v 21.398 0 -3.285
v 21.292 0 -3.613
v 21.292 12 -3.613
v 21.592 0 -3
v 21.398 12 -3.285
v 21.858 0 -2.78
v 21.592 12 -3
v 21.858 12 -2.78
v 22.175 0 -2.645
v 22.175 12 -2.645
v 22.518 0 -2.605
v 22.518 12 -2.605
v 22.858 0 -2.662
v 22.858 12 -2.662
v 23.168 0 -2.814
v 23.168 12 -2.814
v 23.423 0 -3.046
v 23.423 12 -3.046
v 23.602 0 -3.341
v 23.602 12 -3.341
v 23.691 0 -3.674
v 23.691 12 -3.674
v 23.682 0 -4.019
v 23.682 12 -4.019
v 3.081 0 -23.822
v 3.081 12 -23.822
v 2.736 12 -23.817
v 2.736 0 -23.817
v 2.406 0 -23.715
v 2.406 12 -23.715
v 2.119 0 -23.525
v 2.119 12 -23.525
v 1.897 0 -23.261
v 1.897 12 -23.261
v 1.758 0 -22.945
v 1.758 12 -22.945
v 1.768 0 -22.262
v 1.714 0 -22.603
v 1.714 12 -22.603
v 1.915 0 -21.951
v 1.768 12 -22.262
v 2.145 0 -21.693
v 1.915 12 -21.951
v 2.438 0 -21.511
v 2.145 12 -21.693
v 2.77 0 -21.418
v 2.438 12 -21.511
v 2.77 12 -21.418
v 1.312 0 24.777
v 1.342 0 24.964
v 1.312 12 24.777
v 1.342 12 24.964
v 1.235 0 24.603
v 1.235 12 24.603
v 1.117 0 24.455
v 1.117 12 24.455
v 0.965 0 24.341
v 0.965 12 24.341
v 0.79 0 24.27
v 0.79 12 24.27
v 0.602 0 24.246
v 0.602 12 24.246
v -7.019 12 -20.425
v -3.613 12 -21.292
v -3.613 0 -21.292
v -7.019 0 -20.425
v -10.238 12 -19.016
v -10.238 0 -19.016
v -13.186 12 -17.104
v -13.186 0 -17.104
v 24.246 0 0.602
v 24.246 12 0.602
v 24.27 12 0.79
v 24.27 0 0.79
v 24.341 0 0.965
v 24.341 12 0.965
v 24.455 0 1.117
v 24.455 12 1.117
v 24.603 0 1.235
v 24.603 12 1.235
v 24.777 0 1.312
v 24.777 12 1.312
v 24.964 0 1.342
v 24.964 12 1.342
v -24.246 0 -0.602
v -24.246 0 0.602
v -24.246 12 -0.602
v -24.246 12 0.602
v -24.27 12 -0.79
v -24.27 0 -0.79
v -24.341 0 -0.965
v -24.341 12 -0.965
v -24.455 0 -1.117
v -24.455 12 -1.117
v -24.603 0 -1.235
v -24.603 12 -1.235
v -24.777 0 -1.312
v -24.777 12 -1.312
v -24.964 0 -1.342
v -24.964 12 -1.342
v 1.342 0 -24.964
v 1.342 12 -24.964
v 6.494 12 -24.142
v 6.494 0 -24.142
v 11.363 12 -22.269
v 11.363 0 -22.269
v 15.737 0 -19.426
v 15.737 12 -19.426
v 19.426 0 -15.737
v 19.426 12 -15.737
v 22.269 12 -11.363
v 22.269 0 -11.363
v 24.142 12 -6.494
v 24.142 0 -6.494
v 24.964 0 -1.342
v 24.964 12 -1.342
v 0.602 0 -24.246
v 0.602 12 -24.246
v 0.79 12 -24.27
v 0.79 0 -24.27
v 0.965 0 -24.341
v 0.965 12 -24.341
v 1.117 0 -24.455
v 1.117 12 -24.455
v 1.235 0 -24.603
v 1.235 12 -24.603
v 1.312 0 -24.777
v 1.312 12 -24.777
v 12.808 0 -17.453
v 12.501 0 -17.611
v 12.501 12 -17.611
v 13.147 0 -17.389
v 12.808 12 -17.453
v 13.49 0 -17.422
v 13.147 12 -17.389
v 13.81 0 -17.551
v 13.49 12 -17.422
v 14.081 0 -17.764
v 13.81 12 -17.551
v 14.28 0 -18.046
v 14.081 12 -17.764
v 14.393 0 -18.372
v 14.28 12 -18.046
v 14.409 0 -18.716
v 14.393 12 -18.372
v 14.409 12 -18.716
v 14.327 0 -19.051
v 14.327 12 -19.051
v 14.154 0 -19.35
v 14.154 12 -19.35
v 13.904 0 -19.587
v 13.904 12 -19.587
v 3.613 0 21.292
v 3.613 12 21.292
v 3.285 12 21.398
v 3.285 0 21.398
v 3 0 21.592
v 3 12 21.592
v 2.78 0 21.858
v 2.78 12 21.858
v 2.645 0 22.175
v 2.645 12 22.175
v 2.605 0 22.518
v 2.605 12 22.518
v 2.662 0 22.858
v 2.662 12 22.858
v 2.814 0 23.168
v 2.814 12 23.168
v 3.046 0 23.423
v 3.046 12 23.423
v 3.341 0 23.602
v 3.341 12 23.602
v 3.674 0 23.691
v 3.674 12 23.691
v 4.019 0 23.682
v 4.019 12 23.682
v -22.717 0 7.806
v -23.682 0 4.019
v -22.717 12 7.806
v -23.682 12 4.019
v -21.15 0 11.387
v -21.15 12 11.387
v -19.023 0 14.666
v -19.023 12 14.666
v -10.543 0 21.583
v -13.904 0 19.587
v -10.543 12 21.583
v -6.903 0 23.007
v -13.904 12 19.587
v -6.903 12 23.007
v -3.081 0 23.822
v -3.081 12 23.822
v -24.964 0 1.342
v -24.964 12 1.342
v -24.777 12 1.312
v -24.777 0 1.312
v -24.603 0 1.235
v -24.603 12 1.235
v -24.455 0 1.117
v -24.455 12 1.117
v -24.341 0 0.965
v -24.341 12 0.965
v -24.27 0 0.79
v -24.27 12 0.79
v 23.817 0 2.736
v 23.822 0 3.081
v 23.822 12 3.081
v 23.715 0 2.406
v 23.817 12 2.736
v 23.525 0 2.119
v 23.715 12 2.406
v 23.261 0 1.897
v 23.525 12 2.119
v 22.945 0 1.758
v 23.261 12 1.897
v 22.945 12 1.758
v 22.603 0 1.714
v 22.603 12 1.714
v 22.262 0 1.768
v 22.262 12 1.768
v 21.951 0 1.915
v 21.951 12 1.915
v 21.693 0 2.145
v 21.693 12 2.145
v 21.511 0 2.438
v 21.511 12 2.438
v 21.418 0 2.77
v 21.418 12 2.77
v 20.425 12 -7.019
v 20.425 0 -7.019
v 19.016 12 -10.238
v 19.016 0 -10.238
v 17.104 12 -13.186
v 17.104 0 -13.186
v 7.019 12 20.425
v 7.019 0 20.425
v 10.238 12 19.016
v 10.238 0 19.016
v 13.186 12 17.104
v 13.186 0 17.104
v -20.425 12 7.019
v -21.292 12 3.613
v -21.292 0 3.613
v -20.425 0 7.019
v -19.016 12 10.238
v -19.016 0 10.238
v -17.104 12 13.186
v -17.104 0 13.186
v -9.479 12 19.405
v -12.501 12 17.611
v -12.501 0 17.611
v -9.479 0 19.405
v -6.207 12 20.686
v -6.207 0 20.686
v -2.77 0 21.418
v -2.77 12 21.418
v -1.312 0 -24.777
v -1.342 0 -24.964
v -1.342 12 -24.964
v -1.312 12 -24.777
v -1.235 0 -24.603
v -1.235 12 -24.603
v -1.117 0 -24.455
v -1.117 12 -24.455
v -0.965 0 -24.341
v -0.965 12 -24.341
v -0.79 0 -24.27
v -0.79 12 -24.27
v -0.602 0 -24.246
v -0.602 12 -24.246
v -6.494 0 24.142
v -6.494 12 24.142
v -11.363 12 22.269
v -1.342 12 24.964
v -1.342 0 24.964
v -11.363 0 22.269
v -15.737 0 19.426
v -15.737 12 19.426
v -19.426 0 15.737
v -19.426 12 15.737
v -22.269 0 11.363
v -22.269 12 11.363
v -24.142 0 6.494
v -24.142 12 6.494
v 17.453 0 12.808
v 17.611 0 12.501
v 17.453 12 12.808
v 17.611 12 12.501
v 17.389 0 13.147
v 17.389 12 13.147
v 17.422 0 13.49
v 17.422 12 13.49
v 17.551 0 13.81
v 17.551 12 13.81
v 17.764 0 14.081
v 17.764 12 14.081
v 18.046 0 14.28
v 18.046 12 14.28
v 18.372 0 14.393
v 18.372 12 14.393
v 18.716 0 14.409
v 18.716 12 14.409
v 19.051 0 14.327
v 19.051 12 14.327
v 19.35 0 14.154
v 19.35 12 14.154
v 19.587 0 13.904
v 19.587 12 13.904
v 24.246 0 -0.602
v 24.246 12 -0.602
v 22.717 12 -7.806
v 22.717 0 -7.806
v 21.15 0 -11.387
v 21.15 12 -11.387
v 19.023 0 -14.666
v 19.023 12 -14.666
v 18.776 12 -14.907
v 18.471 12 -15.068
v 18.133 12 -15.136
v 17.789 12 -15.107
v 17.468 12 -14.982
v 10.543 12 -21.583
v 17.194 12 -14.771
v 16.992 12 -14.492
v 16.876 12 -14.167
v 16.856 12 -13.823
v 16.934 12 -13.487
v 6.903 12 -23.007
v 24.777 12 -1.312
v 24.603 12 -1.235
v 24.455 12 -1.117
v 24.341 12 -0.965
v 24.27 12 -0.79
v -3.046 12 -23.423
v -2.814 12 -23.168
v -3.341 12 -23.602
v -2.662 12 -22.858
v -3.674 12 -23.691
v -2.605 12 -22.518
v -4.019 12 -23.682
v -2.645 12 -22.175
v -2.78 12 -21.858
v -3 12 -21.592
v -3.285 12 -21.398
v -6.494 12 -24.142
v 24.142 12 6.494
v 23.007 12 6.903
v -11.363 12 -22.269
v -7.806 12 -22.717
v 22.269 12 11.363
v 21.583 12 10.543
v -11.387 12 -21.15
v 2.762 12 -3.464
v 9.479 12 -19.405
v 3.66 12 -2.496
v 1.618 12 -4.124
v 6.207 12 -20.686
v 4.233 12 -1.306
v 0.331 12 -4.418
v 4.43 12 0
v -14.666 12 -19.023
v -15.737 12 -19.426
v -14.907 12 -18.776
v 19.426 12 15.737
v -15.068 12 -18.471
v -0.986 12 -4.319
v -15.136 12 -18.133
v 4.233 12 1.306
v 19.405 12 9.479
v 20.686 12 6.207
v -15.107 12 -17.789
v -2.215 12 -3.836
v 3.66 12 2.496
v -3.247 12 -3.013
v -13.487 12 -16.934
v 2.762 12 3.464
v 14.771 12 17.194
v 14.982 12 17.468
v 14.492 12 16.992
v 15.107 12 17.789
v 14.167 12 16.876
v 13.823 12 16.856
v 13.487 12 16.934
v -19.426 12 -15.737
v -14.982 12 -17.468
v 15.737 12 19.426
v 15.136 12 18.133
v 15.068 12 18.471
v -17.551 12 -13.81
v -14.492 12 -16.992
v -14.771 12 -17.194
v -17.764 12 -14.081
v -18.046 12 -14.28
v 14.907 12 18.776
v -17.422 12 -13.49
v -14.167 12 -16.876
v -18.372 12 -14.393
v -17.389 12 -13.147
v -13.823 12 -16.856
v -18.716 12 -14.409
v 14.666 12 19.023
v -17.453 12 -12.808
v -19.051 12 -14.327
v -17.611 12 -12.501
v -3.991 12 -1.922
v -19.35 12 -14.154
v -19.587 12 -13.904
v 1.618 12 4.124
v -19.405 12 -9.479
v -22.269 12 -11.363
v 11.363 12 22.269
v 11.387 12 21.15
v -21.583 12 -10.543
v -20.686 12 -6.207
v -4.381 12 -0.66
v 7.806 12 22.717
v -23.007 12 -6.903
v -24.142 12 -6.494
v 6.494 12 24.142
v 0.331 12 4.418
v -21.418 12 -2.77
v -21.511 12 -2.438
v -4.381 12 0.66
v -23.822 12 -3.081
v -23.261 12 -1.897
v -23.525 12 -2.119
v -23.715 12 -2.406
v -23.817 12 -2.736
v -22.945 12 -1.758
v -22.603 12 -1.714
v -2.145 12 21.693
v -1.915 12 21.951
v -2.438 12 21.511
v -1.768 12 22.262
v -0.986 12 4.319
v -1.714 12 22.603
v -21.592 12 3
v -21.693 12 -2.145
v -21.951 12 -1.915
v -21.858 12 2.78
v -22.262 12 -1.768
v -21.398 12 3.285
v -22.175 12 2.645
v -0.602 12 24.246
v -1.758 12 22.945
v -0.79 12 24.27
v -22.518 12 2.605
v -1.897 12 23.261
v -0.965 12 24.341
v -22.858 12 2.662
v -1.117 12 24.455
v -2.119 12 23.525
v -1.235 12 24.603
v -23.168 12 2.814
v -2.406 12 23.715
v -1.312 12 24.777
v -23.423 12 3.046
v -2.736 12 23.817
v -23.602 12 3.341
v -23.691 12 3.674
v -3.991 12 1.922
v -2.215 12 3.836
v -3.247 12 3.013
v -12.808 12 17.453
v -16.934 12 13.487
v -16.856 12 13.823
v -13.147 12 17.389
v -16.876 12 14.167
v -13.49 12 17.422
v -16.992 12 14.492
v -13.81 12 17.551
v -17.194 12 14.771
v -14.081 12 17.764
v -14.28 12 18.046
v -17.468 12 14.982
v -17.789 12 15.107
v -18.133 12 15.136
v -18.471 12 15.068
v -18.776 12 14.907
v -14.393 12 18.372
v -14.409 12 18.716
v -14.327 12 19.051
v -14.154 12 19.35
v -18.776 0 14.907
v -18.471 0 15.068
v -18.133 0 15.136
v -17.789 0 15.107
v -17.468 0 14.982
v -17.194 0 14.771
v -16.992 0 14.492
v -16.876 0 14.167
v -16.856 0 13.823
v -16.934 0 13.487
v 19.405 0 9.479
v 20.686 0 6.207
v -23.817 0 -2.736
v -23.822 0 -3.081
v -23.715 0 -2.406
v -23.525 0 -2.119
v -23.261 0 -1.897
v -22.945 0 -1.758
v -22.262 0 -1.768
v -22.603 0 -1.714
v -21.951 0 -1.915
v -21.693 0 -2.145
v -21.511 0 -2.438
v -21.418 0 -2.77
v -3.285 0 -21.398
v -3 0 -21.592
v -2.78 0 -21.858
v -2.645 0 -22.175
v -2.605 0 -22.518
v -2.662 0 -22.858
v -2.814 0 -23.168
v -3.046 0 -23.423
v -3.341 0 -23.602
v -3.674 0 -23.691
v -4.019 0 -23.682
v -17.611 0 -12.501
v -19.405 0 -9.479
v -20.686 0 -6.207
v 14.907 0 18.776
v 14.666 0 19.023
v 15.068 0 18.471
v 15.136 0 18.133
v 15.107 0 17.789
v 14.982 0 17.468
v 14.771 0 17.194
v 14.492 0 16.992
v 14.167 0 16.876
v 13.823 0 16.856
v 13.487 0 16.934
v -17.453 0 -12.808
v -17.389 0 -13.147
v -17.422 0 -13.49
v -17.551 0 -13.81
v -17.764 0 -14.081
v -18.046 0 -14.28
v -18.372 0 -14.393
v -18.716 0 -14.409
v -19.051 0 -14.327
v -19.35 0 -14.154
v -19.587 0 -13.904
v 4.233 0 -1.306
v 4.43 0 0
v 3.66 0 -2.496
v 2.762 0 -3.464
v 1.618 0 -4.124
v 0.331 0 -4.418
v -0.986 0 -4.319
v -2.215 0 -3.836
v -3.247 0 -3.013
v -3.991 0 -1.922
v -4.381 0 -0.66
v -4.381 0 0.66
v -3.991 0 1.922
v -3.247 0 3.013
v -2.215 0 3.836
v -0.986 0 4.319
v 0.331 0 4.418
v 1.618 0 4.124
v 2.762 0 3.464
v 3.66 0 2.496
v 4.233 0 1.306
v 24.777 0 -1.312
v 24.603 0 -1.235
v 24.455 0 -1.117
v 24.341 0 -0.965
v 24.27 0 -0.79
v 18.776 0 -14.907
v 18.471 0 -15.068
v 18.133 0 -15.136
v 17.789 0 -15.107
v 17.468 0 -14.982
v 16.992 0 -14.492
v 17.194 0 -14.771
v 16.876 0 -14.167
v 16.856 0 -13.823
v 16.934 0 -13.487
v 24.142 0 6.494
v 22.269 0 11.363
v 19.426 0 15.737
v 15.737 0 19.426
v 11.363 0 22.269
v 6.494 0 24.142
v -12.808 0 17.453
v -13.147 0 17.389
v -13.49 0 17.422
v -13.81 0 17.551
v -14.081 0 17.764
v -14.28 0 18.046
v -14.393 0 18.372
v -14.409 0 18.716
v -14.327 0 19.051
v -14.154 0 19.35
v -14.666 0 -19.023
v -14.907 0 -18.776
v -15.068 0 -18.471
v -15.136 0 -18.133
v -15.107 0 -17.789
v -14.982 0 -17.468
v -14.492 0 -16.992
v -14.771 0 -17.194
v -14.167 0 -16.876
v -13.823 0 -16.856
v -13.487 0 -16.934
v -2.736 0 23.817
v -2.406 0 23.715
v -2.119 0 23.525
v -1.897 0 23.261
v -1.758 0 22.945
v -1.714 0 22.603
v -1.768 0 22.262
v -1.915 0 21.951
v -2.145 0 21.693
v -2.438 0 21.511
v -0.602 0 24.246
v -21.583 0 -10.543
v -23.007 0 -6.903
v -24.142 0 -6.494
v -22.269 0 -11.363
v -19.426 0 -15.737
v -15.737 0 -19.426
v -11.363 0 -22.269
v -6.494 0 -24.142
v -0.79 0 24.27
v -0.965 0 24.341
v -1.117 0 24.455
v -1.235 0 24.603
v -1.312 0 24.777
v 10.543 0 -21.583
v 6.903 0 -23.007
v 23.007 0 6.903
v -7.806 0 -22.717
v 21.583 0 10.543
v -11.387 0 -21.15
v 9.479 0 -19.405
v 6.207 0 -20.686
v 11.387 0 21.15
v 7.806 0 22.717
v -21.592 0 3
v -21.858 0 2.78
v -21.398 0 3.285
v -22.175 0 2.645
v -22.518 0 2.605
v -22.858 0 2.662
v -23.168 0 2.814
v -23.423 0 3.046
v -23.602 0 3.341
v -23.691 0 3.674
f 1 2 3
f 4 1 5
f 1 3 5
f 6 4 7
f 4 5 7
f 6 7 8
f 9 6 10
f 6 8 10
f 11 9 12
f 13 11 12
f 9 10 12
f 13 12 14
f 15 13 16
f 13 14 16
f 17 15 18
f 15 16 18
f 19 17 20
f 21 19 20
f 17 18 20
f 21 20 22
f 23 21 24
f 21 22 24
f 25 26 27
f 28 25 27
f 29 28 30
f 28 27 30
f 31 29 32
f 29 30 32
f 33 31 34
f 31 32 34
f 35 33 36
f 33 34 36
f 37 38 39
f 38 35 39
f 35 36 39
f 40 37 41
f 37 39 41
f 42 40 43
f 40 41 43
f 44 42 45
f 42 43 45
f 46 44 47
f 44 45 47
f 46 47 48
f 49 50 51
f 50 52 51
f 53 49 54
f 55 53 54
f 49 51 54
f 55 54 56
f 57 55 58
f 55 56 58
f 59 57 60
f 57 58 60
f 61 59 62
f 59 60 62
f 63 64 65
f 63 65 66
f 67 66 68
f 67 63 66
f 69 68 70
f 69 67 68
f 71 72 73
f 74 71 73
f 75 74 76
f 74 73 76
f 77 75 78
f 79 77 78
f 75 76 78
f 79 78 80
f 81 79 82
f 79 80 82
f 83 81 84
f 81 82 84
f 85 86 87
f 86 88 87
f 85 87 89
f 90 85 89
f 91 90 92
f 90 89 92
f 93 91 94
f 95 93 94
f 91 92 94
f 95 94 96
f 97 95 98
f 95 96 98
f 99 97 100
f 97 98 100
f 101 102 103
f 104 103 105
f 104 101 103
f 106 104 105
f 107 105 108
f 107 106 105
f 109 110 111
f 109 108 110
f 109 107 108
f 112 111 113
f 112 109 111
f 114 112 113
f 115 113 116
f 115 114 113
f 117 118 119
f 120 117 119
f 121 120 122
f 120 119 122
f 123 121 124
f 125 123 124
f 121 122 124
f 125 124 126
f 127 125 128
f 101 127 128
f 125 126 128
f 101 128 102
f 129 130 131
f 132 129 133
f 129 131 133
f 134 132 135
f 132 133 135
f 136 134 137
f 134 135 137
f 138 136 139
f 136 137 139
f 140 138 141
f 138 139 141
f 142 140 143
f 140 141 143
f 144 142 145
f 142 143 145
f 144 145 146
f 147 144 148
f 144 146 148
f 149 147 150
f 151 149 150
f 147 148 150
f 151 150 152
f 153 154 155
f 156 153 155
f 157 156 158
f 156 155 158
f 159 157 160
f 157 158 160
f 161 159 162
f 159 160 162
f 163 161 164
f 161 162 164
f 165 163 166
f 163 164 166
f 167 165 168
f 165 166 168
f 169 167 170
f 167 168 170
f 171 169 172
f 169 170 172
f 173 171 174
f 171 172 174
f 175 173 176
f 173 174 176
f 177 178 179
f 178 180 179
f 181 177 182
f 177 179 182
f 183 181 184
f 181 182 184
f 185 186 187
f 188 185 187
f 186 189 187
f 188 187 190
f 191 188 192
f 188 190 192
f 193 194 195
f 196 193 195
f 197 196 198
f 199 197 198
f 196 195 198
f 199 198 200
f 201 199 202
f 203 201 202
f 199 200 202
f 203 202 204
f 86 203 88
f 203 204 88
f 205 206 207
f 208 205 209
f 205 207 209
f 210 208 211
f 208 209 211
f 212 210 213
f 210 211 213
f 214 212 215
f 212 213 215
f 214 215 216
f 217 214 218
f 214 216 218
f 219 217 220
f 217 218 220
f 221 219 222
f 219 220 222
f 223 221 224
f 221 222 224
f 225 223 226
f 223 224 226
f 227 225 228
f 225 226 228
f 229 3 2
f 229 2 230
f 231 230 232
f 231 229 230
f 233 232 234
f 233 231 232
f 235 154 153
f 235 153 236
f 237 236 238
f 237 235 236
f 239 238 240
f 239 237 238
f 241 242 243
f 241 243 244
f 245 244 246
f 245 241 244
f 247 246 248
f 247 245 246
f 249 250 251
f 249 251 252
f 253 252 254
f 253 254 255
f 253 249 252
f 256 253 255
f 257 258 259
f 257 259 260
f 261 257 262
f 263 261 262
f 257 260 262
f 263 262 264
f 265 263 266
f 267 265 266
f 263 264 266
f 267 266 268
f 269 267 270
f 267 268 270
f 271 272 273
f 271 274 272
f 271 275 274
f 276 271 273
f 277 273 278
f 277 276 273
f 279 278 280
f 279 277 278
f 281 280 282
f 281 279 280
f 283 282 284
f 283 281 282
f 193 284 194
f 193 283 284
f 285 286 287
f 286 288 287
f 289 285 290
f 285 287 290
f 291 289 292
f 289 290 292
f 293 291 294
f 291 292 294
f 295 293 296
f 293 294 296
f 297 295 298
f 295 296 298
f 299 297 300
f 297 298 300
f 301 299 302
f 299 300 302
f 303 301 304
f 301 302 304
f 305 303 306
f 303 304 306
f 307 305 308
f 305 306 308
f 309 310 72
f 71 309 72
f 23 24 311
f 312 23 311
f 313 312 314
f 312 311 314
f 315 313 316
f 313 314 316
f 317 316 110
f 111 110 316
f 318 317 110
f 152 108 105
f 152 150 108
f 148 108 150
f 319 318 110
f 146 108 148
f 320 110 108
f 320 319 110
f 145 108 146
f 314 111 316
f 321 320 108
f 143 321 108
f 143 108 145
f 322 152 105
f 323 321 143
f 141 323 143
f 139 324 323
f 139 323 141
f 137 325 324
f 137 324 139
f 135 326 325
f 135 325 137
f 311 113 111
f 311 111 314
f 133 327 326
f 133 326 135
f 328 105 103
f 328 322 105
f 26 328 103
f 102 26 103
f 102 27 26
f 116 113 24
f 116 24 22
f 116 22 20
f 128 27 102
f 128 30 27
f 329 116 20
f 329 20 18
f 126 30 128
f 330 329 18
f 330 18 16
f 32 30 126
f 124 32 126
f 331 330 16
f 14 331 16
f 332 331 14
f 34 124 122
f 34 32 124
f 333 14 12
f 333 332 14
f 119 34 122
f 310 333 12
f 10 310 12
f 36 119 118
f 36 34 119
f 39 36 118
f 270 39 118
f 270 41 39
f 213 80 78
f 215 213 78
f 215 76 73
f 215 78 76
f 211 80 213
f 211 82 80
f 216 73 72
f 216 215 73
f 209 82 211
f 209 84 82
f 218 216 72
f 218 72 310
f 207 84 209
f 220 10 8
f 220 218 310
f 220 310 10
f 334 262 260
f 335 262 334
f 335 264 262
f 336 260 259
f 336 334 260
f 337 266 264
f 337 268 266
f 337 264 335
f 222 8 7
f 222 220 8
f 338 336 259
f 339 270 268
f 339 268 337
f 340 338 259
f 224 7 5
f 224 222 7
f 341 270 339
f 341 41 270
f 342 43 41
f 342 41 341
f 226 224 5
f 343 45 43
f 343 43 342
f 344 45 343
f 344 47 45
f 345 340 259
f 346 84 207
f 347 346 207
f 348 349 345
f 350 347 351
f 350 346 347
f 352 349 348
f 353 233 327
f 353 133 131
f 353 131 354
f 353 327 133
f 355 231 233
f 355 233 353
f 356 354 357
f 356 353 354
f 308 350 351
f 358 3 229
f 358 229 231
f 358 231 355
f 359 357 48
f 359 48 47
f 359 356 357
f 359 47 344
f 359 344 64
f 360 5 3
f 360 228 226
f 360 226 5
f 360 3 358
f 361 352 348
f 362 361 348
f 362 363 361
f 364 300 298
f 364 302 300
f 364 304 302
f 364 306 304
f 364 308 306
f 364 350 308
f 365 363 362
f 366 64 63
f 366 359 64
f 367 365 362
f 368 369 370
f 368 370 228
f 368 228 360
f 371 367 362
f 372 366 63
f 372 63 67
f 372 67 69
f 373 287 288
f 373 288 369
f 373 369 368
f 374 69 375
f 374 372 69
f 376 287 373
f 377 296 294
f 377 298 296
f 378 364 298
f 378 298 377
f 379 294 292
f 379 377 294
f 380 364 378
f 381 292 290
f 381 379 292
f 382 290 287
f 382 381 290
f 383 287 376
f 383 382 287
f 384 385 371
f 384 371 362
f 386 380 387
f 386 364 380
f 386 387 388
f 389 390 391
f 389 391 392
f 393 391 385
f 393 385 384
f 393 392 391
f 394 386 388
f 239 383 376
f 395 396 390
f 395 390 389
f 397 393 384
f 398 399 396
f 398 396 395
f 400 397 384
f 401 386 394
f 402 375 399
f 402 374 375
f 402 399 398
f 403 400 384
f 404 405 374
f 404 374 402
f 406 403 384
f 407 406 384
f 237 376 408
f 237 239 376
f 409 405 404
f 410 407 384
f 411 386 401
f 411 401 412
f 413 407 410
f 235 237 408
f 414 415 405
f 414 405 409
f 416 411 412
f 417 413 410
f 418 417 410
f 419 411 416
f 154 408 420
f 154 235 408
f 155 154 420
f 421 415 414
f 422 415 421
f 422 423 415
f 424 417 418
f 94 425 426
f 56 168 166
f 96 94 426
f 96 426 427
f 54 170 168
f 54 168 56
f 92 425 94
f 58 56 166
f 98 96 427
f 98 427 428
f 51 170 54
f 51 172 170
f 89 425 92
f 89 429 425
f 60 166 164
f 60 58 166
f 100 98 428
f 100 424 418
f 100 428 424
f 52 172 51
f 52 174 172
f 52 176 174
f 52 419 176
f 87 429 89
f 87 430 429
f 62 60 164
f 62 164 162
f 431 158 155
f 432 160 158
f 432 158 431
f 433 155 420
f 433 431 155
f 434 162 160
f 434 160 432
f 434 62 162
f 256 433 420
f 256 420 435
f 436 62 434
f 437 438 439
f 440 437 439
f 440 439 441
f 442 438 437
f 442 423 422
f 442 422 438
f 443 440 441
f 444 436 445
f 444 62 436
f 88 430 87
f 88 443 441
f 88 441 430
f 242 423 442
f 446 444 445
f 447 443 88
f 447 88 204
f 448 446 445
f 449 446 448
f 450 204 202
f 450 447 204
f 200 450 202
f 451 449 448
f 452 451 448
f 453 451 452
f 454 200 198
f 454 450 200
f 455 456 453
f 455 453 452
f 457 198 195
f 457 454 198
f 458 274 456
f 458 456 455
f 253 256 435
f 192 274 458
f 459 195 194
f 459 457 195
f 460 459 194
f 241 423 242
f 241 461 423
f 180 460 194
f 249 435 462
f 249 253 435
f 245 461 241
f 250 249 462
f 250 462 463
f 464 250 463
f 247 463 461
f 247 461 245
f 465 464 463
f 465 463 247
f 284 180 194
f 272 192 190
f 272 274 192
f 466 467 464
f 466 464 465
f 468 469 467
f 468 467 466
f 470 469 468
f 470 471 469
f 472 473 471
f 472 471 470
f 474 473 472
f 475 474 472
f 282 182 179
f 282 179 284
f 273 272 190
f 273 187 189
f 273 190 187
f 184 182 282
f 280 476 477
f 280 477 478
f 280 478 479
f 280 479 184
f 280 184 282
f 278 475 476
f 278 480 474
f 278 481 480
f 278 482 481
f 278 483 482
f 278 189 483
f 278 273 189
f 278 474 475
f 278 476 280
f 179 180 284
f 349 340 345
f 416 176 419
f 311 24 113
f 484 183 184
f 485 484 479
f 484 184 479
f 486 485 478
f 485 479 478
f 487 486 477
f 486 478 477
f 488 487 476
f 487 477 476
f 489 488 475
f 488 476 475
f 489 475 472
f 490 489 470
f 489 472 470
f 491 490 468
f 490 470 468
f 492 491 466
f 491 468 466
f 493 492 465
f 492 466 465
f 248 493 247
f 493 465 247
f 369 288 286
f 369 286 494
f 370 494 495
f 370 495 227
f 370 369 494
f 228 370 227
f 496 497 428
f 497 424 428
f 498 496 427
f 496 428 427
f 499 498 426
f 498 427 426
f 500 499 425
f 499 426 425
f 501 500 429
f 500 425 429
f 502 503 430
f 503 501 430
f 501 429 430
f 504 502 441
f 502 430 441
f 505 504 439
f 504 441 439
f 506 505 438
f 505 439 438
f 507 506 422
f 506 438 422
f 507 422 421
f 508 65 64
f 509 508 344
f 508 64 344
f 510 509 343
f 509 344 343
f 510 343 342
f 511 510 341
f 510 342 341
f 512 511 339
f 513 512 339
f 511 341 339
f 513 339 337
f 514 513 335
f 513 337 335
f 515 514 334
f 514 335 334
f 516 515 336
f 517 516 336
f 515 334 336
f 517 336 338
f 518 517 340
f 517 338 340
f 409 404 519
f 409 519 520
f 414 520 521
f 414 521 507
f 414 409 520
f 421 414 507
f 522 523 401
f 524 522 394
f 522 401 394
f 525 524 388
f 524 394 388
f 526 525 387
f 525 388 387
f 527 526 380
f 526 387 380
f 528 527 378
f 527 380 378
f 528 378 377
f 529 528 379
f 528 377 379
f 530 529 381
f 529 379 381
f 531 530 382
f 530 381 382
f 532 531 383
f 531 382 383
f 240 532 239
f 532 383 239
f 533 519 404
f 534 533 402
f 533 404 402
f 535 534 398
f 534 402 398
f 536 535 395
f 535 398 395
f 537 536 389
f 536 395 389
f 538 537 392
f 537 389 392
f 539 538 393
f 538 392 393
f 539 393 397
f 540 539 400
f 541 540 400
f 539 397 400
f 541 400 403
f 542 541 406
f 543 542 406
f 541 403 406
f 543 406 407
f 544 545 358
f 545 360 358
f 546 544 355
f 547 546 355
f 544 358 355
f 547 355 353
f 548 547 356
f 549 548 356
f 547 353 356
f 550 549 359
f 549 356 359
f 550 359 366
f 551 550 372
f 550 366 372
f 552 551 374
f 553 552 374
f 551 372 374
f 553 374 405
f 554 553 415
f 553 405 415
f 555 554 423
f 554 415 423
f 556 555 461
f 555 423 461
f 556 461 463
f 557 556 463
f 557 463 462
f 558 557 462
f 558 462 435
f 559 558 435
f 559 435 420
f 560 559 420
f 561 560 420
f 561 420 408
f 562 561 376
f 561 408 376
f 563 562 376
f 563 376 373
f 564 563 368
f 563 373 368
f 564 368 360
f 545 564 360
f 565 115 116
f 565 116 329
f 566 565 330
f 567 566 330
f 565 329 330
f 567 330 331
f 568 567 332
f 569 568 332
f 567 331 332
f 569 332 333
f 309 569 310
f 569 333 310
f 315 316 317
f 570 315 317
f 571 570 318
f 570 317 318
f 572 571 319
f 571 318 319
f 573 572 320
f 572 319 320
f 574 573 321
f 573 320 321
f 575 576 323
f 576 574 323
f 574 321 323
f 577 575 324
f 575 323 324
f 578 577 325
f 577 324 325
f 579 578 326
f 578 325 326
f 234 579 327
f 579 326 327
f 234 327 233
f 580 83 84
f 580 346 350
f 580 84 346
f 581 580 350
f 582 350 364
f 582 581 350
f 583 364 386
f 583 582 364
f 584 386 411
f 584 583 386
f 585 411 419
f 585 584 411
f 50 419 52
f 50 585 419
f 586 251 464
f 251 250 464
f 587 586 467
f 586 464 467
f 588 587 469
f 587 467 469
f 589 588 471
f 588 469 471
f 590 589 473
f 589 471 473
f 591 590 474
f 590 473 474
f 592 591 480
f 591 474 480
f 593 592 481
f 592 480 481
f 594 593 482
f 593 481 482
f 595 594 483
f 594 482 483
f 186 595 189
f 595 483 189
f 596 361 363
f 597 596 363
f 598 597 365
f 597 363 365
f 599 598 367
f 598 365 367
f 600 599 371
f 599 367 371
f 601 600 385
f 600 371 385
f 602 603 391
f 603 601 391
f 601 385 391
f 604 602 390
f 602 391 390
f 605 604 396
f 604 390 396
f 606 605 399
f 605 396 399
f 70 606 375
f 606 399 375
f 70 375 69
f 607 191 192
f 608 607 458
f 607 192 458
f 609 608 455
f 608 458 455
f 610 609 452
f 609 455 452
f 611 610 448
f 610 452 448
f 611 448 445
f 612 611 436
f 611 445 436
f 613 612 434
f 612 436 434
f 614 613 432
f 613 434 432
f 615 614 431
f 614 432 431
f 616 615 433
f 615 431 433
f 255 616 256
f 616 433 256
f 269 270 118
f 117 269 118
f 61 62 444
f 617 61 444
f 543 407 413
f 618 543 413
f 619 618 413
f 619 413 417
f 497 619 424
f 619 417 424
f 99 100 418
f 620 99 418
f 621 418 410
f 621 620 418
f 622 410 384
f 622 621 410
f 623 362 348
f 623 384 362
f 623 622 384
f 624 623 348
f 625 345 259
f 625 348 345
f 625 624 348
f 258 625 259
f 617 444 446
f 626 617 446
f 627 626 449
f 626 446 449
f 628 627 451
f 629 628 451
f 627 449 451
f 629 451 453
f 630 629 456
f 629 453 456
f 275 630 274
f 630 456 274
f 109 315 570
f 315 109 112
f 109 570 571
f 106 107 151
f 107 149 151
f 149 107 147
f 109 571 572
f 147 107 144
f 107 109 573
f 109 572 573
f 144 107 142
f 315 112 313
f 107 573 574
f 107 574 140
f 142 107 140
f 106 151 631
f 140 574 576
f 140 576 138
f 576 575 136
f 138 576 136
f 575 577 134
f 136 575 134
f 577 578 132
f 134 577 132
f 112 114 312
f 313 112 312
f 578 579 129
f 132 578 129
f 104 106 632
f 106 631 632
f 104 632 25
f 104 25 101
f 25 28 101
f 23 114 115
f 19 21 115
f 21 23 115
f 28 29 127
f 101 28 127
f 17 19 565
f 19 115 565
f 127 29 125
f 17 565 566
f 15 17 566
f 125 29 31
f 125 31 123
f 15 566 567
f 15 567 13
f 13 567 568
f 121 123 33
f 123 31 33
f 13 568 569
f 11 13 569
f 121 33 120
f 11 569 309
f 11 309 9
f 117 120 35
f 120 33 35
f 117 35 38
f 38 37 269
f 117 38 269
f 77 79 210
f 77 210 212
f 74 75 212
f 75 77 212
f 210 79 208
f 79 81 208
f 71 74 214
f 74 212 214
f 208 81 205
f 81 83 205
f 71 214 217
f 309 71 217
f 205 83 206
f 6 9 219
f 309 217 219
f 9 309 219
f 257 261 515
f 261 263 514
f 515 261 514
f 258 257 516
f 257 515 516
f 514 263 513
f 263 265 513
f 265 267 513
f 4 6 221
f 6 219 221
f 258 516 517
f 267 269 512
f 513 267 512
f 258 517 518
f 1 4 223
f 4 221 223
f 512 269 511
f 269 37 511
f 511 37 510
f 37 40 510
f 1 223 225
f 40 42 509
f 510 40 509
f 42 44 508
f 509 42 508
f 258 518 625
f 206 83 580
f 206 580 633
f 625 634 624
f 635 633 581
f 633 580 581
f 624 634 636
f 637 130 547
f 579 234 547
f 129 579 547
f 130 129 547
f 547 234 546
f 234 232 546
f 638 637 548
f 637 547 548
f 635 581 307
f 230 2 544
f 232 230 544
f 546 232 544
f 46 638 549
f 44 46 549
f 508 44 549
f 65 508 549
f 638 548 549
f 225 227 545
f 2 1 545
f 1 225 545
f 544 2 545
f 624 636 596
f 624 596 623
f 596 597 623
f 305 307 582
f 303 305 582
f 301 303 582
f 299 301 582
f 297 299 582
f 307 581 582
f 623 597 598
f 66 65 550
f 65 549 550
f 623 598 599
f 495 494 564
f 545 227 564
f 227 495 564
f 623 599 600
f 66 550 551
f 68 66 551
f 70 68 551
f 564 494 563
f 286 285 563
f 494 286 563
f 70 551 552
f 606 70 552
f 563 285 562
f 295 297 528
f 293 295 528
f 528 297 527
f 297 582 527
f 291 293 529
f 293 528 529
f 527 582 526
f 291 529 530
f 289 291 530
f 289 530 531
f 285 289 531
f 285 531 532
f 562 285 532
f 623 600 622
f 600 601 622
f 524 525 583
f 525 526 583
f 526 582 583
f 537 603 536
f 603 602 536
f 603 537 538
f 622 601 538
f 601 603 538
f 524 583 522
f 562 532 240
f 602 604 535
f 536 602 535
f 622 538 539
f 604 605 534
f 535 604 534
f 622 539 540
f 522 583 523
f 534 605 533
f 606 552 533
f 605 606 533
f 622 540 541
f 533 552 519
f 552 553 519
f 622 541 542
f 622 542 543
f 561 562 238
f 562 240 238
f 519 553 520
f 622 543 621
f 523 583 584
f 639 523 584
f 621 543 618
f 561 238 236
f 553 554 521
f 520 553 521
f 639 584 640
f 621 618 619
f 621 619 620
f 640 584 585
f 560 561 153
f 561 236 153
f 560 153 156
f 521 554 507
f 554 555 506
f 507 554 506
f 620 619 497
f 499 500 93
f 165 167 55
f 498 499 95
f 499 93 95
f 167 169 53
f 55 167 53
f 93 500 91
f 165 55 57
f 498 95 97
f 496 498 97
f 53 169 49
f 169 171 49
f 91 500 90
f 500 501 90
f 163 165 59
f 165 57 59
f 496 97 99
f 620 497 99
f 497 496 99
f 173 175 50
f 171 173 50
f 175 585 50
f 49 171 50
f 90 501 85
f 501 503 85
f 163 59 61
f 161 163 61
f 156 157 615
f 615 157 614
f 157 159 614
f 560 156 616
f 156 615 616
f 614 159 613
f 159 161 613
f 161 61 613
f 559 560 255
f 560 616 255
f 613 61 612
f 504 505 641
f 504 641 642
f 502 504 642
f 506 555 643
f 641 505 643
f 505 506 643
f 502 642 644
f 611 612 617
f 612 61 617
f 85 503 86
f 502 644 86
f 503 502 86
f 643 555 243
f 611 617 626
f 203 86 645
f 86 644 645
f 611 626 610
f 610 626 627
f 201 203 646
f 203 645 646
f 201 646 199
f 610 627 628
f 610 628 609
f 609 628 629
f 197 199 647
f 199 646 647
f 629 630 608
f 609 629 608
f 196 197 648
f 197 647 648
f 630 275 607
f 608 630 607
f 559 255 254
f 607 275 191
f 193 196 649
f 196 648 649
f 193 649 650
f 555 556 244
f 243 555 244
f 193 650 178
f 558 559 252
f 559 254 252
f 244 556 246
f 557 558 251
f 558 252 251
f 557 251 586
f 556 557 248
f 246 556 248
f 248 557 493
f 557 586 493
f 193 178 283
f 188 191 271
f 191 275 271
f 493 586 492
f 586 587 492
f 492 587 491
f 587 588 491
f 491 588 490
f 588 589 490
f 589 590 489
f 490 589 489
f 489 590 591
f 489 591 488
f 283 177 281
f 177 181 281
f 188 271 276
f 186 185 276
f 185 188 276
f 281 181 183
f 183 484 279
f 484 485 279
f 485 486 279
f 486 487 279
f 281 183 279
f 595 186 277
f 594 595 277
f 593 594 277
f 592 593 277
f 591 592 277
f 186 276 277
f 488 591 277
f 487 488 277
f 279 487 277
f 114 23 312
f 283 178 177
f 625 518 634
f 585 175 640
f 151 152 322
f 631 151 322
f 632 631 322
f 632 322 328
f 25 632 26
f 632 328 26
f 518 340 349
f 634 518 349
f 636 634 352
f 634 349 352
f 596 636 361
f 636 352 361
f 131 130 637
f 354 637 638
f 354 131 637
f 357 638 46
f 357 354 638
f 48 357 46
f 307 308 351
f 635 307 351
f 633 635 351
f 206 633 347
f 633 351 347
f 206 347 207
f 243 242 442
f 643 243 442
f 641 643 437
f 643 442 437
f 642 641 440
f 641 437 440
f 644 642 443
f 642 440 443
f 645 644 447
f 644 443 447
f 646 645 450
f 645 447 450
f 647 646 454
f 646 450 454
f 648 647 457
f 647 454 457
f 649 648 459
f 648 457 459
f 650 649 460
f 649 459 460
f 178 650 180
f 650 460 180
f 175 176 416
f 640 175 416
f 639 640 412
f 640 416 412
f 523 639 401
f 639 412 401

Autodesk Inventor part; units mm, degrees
ref_plane "YZ Plane" through (0, 0, 0) normal (1, 0, 0) x (0, 1, 0)
ref_plane "XZ Plane" through (0, 0, 0) normal (0, 1, 0) x (-1, 0, 0)
ref_plane "XY Plane" through (0, 0, 0) normal (0, 0, 1) x (1, 0, 0)
sketch "Sketch1" plane through (0, 0, 0) normal (0, 1, 0) x (-1, 0, 0)
  circle A0 centre (0, 0) radius 25
  dimension "d1" = 50
extrude "Extrusion1" add sketch "Sketch1" along normal blind 12
sketch "Sketch2" plane through (0, 12, 0) normal (0, 1, 0) x (1, 0, 0)
  circle A0 centre (0, 0) radius 1.3723
  line L0 (-24.9867, -1.3423) -> (-24.9867, 1.3423) construction
  line L1 (-24.2459, -0.6015) -> (-24.2459, 0.6015)
  line L2 (-25.7274, 0.6015) -> (-25.7274, -0.6015)
  arc A1 (-25.7274, -0.6015) -> (-24.2459, -0.6015) centre (-24.9867, -0.6015) ccw
  arc A2 (-24.2459, 0.6015) -> (-25.7274, 0.6015) centre (-24.9867, 0.6015) ccw
  line L3 (1.3423, -24.9867) -> (-1.3423, -24.9867) construction
  line L4 (0.6015, -24.2459) -> (-0.6015, -24.2459)
  line L5 (-0.6015, -25.7274) -> (0.6015, -25.7274)
  arc A3 (0.6015, -25.7274) -> (0.6015, -24.2459) centre (0.6015, -24.9867) ccw
  arc A4 (-0.6015, -24.2459) -> (-0.6015, -25.7274) centre (-0.6015, -24.9867) ccw
  line L6 (24.9867, 1.3423) -> (24.9867, -1.3423) construction
  line L7 (24.2459, 0.6015) -> (24.2459, -0.6015)
  line L8 (25.7274, -0.6015) -> (25.7274, 0.6015)
  arc A5 (25.7274, 0.6015) -> (24.2459, 0.6015) centre (24.9867, 0.6015) ccw
  arc A6 (24.2459, -0.6015) -> (25.7274, -0.6015) centre (24.9867, -0.6015) ccw
  line L9 (-1.3423, 24.9867) -> (1.3423, 24.9867) construction
  line L10 (-0.6015, 24.2459) -> (0.6015, 24.2459)
  line L11 (0.6015, 25.7274) -> (-0.6015, 25.7274)
  arc A7 (-0.6015, 25.7274) -> (-0.6015, 24.2459) centre (-0.6015, 24.9867) ccw
  arc A8 (0.6015, 24.2459) -> (0.6015, 25.7274) centre (0.6015, 24.9867) ccw
  point P0 (-24.9867, 0)
  point P1 (0, -24.9867)
  point P2 (24.9867, 0)
  point P3 (0, 24.9867)
  dimension "d11" = 360
extrude "Extrusion2" cut sketch "Sketch2" against normal blind 12 contours A1 L2 A2 L1 | A3 L5 A4 L4 | A5 L8 A6 L7 | A7 L11 A8 L10
sketch "Sketch3" plane through (0, 12, 0) normal (0, 1, 0) x (1, 0, 0)
  circle A0 centre (0, 0) radius 22.8086
  arc A1 (13.2024, 18.5991) -> (2.9253, 22.6202) centre (0, 0) ccw construction
  arc A2 (13.9039, 19.5873) -> (3.0807, 23.822) centre (0, 0) ccw
  arc A3 (12.501, 17.611) -> (2.7699, 21.4184) centre (0, 0) ccw
  arc A4 (12.501, 17.611) -> (13.9039, 19.5873) centre (13.2024, 18.5991) ccw
  arc A5 (3.0807, 23.822) -> (2.7699, 21.4184) centre (2.9253, 22.6202) ccw
  line L0 (0, 0) -> (13.2024, 18.5991) construction
  line L1 (0, 0) -> (2.9253, 22.6202) construction
  arc A6 (-4.0188, 23.6818) -> (-14.6663, 19.0231) centre (0, 0) ccw
  arc A7 (-14.6663, 19.0231) -> (-13.1865, 17.1037) centre (-13.9264, 18.0634) ccw
  arc A8 (-3.6133, 21.2924) -> (-13.1865, 17.1037) centre (0, 0) ccw
  arc A9 (-3.6133, 21.2924) -> (-4.0188, 23.6818) centre (-3.816, 22.4871) ccw
  arc A10 (-19.5873, 13.9039) -> (-23.822, 3.0807) centre (0, 0) ccw
  arc A11 (-23.822, 3.0807) -> (-21.4184, 2.7699) centre (-22.6202, 2.9253) ccw
  arc A12 (-17.611, 12.501) -> (-21.4184, 2.7699) centre (0, 0) ccw
  arc A13 (-17.611, 12.501) -> (-19.5873, 13.9039) centre (-18.5991, 13.2024) ccw
  arc A14 (-23.6818, -4.0188) -> (-19.0231, -14.6663) centre (0, 0) ccw
  arc A15 (-19.0231, -14.6663) -> (-17.1037, -13.1865) centre (-18.0634, -13.9264) ccw
  arc A16 (-21.2924, -3.6133) -> (-17.1037, -13.1865) centre (0, 0) ccw
  arc A17 (-21.2924, -3.6133) -> (-23.6818, -4.0188) centre (-22.4871, -3.816) ccw
  arc A18 (-13.9039, -19.5873) -> (-3.0807, -23.822) centre (0, 0) ccw
  arc A19 (-3.0807, -23.822) -> (-2.7699, -21.4184) centre (-2.9253, -22.6202) ccw
  arc A20 (-12.501, -17.611) -> (-2.7699, -21.4184) centre (0, 0) ccw
  arc A21 (-12.501, -17.611) -> (-13.9039, -19.5873) centre (-13.2024, -18.5991) ccw
  arc A22 (4.0188, -23.6818) -> (14.6663, -19.0231) centre (0, 0) ccw
  arc A23 (14.6663, -19.0231) -> (13.1865, -17.1037) centre (13.9264, -18.0634) ccw
  arc A24 (3.6133, -21.2924) -> (13.1865, -17.1037) centre (0, 0) ccw
  arc A25 (3.6133, -21.2924) -> (4.0188, -23.6818) centre (3.816, -22.4871) ccw
  arc A26 (19.5873, -13.9039) -> (23.822, -3.0807) centre (0, 0) ccw
  arc A27 (23.822, -3.0807) -> (21.4184, -2.7699) centre (22.6202, -2.9253) ccw
  arc A28 (17.611, -12.501) -> (21.4184, -2.7699) centre (0, 0) ccw
  arc A29 (17.611, -12.501) -> (19.5873, -13.9039) centre (18.5991, -13.2024) ccw
  arc A30 (23.6818, 4.0188) -> (19.0231, 14.6663) centre (0, 0) ccw
  arc A31 (19.0231, 14.6663) -> (17.1037, 13.1865) centre (18.0634, 13.9264) ccw
  arc A32 (21.2924, 3.6133) -> (17.1037, 13.1865) centre (0, 0) ccw
  arc A33 (21.2924, 3.6133) -> (23.6818, 4.0188) centre (22.4871, 3.816) ccw
  dimension "d15" = 28
  dimension "d18" = 360
extrude "Extrusion3" cut sketch "Sketch3" against normal blind 12 contours A33 A32 A31 A0 | A0 A31 A30 A33 | A27 A26 A29 A0 | A0 A29 A28 A27 | A4 A3 A5 A0 | A0 A5 A2 A4 | A23 A22 A25 A0 | A0 A25 A24 A23 | A9 A8 A7 A0 | A0 A7 A6 A9 | A19 A18 A21 A0 | A0 A21 A20 A19 | A13 A12 A11 A0 | A0 A11 A10 A13 | A15 A14 A17 A0 | A0 A17 A16 A15
sketch "Sketch4" plane through (0, 12, 0) normal (0, 1, 0) x (1, 0, 0)
  circle A0 centre (0, 0) radius 4.43
  dimension "d22" = 8.86
extrude "Extrusion4" cut sketch "Sketch4" against normal blind 12
thread "Thread1" size "M10x1.25" class "6H" standard "ISO Metric profile" full length
sketch "Sketch5" plane through (0, 12, 0) normal (0, 1, 0) x (1, 0, 0)
  circle A0 centre (0, 0) radius 4.43
extrude "Extrusion5" [suppressed]
thread "Thread3" size "M10x1" class "6g" standard "ANSI Metric M Profile" full length
thread "Thread4" size "M10x1" class "6g" standard "ANSI Metric M Profile" full length
properties part number "ICRC wrist model"
